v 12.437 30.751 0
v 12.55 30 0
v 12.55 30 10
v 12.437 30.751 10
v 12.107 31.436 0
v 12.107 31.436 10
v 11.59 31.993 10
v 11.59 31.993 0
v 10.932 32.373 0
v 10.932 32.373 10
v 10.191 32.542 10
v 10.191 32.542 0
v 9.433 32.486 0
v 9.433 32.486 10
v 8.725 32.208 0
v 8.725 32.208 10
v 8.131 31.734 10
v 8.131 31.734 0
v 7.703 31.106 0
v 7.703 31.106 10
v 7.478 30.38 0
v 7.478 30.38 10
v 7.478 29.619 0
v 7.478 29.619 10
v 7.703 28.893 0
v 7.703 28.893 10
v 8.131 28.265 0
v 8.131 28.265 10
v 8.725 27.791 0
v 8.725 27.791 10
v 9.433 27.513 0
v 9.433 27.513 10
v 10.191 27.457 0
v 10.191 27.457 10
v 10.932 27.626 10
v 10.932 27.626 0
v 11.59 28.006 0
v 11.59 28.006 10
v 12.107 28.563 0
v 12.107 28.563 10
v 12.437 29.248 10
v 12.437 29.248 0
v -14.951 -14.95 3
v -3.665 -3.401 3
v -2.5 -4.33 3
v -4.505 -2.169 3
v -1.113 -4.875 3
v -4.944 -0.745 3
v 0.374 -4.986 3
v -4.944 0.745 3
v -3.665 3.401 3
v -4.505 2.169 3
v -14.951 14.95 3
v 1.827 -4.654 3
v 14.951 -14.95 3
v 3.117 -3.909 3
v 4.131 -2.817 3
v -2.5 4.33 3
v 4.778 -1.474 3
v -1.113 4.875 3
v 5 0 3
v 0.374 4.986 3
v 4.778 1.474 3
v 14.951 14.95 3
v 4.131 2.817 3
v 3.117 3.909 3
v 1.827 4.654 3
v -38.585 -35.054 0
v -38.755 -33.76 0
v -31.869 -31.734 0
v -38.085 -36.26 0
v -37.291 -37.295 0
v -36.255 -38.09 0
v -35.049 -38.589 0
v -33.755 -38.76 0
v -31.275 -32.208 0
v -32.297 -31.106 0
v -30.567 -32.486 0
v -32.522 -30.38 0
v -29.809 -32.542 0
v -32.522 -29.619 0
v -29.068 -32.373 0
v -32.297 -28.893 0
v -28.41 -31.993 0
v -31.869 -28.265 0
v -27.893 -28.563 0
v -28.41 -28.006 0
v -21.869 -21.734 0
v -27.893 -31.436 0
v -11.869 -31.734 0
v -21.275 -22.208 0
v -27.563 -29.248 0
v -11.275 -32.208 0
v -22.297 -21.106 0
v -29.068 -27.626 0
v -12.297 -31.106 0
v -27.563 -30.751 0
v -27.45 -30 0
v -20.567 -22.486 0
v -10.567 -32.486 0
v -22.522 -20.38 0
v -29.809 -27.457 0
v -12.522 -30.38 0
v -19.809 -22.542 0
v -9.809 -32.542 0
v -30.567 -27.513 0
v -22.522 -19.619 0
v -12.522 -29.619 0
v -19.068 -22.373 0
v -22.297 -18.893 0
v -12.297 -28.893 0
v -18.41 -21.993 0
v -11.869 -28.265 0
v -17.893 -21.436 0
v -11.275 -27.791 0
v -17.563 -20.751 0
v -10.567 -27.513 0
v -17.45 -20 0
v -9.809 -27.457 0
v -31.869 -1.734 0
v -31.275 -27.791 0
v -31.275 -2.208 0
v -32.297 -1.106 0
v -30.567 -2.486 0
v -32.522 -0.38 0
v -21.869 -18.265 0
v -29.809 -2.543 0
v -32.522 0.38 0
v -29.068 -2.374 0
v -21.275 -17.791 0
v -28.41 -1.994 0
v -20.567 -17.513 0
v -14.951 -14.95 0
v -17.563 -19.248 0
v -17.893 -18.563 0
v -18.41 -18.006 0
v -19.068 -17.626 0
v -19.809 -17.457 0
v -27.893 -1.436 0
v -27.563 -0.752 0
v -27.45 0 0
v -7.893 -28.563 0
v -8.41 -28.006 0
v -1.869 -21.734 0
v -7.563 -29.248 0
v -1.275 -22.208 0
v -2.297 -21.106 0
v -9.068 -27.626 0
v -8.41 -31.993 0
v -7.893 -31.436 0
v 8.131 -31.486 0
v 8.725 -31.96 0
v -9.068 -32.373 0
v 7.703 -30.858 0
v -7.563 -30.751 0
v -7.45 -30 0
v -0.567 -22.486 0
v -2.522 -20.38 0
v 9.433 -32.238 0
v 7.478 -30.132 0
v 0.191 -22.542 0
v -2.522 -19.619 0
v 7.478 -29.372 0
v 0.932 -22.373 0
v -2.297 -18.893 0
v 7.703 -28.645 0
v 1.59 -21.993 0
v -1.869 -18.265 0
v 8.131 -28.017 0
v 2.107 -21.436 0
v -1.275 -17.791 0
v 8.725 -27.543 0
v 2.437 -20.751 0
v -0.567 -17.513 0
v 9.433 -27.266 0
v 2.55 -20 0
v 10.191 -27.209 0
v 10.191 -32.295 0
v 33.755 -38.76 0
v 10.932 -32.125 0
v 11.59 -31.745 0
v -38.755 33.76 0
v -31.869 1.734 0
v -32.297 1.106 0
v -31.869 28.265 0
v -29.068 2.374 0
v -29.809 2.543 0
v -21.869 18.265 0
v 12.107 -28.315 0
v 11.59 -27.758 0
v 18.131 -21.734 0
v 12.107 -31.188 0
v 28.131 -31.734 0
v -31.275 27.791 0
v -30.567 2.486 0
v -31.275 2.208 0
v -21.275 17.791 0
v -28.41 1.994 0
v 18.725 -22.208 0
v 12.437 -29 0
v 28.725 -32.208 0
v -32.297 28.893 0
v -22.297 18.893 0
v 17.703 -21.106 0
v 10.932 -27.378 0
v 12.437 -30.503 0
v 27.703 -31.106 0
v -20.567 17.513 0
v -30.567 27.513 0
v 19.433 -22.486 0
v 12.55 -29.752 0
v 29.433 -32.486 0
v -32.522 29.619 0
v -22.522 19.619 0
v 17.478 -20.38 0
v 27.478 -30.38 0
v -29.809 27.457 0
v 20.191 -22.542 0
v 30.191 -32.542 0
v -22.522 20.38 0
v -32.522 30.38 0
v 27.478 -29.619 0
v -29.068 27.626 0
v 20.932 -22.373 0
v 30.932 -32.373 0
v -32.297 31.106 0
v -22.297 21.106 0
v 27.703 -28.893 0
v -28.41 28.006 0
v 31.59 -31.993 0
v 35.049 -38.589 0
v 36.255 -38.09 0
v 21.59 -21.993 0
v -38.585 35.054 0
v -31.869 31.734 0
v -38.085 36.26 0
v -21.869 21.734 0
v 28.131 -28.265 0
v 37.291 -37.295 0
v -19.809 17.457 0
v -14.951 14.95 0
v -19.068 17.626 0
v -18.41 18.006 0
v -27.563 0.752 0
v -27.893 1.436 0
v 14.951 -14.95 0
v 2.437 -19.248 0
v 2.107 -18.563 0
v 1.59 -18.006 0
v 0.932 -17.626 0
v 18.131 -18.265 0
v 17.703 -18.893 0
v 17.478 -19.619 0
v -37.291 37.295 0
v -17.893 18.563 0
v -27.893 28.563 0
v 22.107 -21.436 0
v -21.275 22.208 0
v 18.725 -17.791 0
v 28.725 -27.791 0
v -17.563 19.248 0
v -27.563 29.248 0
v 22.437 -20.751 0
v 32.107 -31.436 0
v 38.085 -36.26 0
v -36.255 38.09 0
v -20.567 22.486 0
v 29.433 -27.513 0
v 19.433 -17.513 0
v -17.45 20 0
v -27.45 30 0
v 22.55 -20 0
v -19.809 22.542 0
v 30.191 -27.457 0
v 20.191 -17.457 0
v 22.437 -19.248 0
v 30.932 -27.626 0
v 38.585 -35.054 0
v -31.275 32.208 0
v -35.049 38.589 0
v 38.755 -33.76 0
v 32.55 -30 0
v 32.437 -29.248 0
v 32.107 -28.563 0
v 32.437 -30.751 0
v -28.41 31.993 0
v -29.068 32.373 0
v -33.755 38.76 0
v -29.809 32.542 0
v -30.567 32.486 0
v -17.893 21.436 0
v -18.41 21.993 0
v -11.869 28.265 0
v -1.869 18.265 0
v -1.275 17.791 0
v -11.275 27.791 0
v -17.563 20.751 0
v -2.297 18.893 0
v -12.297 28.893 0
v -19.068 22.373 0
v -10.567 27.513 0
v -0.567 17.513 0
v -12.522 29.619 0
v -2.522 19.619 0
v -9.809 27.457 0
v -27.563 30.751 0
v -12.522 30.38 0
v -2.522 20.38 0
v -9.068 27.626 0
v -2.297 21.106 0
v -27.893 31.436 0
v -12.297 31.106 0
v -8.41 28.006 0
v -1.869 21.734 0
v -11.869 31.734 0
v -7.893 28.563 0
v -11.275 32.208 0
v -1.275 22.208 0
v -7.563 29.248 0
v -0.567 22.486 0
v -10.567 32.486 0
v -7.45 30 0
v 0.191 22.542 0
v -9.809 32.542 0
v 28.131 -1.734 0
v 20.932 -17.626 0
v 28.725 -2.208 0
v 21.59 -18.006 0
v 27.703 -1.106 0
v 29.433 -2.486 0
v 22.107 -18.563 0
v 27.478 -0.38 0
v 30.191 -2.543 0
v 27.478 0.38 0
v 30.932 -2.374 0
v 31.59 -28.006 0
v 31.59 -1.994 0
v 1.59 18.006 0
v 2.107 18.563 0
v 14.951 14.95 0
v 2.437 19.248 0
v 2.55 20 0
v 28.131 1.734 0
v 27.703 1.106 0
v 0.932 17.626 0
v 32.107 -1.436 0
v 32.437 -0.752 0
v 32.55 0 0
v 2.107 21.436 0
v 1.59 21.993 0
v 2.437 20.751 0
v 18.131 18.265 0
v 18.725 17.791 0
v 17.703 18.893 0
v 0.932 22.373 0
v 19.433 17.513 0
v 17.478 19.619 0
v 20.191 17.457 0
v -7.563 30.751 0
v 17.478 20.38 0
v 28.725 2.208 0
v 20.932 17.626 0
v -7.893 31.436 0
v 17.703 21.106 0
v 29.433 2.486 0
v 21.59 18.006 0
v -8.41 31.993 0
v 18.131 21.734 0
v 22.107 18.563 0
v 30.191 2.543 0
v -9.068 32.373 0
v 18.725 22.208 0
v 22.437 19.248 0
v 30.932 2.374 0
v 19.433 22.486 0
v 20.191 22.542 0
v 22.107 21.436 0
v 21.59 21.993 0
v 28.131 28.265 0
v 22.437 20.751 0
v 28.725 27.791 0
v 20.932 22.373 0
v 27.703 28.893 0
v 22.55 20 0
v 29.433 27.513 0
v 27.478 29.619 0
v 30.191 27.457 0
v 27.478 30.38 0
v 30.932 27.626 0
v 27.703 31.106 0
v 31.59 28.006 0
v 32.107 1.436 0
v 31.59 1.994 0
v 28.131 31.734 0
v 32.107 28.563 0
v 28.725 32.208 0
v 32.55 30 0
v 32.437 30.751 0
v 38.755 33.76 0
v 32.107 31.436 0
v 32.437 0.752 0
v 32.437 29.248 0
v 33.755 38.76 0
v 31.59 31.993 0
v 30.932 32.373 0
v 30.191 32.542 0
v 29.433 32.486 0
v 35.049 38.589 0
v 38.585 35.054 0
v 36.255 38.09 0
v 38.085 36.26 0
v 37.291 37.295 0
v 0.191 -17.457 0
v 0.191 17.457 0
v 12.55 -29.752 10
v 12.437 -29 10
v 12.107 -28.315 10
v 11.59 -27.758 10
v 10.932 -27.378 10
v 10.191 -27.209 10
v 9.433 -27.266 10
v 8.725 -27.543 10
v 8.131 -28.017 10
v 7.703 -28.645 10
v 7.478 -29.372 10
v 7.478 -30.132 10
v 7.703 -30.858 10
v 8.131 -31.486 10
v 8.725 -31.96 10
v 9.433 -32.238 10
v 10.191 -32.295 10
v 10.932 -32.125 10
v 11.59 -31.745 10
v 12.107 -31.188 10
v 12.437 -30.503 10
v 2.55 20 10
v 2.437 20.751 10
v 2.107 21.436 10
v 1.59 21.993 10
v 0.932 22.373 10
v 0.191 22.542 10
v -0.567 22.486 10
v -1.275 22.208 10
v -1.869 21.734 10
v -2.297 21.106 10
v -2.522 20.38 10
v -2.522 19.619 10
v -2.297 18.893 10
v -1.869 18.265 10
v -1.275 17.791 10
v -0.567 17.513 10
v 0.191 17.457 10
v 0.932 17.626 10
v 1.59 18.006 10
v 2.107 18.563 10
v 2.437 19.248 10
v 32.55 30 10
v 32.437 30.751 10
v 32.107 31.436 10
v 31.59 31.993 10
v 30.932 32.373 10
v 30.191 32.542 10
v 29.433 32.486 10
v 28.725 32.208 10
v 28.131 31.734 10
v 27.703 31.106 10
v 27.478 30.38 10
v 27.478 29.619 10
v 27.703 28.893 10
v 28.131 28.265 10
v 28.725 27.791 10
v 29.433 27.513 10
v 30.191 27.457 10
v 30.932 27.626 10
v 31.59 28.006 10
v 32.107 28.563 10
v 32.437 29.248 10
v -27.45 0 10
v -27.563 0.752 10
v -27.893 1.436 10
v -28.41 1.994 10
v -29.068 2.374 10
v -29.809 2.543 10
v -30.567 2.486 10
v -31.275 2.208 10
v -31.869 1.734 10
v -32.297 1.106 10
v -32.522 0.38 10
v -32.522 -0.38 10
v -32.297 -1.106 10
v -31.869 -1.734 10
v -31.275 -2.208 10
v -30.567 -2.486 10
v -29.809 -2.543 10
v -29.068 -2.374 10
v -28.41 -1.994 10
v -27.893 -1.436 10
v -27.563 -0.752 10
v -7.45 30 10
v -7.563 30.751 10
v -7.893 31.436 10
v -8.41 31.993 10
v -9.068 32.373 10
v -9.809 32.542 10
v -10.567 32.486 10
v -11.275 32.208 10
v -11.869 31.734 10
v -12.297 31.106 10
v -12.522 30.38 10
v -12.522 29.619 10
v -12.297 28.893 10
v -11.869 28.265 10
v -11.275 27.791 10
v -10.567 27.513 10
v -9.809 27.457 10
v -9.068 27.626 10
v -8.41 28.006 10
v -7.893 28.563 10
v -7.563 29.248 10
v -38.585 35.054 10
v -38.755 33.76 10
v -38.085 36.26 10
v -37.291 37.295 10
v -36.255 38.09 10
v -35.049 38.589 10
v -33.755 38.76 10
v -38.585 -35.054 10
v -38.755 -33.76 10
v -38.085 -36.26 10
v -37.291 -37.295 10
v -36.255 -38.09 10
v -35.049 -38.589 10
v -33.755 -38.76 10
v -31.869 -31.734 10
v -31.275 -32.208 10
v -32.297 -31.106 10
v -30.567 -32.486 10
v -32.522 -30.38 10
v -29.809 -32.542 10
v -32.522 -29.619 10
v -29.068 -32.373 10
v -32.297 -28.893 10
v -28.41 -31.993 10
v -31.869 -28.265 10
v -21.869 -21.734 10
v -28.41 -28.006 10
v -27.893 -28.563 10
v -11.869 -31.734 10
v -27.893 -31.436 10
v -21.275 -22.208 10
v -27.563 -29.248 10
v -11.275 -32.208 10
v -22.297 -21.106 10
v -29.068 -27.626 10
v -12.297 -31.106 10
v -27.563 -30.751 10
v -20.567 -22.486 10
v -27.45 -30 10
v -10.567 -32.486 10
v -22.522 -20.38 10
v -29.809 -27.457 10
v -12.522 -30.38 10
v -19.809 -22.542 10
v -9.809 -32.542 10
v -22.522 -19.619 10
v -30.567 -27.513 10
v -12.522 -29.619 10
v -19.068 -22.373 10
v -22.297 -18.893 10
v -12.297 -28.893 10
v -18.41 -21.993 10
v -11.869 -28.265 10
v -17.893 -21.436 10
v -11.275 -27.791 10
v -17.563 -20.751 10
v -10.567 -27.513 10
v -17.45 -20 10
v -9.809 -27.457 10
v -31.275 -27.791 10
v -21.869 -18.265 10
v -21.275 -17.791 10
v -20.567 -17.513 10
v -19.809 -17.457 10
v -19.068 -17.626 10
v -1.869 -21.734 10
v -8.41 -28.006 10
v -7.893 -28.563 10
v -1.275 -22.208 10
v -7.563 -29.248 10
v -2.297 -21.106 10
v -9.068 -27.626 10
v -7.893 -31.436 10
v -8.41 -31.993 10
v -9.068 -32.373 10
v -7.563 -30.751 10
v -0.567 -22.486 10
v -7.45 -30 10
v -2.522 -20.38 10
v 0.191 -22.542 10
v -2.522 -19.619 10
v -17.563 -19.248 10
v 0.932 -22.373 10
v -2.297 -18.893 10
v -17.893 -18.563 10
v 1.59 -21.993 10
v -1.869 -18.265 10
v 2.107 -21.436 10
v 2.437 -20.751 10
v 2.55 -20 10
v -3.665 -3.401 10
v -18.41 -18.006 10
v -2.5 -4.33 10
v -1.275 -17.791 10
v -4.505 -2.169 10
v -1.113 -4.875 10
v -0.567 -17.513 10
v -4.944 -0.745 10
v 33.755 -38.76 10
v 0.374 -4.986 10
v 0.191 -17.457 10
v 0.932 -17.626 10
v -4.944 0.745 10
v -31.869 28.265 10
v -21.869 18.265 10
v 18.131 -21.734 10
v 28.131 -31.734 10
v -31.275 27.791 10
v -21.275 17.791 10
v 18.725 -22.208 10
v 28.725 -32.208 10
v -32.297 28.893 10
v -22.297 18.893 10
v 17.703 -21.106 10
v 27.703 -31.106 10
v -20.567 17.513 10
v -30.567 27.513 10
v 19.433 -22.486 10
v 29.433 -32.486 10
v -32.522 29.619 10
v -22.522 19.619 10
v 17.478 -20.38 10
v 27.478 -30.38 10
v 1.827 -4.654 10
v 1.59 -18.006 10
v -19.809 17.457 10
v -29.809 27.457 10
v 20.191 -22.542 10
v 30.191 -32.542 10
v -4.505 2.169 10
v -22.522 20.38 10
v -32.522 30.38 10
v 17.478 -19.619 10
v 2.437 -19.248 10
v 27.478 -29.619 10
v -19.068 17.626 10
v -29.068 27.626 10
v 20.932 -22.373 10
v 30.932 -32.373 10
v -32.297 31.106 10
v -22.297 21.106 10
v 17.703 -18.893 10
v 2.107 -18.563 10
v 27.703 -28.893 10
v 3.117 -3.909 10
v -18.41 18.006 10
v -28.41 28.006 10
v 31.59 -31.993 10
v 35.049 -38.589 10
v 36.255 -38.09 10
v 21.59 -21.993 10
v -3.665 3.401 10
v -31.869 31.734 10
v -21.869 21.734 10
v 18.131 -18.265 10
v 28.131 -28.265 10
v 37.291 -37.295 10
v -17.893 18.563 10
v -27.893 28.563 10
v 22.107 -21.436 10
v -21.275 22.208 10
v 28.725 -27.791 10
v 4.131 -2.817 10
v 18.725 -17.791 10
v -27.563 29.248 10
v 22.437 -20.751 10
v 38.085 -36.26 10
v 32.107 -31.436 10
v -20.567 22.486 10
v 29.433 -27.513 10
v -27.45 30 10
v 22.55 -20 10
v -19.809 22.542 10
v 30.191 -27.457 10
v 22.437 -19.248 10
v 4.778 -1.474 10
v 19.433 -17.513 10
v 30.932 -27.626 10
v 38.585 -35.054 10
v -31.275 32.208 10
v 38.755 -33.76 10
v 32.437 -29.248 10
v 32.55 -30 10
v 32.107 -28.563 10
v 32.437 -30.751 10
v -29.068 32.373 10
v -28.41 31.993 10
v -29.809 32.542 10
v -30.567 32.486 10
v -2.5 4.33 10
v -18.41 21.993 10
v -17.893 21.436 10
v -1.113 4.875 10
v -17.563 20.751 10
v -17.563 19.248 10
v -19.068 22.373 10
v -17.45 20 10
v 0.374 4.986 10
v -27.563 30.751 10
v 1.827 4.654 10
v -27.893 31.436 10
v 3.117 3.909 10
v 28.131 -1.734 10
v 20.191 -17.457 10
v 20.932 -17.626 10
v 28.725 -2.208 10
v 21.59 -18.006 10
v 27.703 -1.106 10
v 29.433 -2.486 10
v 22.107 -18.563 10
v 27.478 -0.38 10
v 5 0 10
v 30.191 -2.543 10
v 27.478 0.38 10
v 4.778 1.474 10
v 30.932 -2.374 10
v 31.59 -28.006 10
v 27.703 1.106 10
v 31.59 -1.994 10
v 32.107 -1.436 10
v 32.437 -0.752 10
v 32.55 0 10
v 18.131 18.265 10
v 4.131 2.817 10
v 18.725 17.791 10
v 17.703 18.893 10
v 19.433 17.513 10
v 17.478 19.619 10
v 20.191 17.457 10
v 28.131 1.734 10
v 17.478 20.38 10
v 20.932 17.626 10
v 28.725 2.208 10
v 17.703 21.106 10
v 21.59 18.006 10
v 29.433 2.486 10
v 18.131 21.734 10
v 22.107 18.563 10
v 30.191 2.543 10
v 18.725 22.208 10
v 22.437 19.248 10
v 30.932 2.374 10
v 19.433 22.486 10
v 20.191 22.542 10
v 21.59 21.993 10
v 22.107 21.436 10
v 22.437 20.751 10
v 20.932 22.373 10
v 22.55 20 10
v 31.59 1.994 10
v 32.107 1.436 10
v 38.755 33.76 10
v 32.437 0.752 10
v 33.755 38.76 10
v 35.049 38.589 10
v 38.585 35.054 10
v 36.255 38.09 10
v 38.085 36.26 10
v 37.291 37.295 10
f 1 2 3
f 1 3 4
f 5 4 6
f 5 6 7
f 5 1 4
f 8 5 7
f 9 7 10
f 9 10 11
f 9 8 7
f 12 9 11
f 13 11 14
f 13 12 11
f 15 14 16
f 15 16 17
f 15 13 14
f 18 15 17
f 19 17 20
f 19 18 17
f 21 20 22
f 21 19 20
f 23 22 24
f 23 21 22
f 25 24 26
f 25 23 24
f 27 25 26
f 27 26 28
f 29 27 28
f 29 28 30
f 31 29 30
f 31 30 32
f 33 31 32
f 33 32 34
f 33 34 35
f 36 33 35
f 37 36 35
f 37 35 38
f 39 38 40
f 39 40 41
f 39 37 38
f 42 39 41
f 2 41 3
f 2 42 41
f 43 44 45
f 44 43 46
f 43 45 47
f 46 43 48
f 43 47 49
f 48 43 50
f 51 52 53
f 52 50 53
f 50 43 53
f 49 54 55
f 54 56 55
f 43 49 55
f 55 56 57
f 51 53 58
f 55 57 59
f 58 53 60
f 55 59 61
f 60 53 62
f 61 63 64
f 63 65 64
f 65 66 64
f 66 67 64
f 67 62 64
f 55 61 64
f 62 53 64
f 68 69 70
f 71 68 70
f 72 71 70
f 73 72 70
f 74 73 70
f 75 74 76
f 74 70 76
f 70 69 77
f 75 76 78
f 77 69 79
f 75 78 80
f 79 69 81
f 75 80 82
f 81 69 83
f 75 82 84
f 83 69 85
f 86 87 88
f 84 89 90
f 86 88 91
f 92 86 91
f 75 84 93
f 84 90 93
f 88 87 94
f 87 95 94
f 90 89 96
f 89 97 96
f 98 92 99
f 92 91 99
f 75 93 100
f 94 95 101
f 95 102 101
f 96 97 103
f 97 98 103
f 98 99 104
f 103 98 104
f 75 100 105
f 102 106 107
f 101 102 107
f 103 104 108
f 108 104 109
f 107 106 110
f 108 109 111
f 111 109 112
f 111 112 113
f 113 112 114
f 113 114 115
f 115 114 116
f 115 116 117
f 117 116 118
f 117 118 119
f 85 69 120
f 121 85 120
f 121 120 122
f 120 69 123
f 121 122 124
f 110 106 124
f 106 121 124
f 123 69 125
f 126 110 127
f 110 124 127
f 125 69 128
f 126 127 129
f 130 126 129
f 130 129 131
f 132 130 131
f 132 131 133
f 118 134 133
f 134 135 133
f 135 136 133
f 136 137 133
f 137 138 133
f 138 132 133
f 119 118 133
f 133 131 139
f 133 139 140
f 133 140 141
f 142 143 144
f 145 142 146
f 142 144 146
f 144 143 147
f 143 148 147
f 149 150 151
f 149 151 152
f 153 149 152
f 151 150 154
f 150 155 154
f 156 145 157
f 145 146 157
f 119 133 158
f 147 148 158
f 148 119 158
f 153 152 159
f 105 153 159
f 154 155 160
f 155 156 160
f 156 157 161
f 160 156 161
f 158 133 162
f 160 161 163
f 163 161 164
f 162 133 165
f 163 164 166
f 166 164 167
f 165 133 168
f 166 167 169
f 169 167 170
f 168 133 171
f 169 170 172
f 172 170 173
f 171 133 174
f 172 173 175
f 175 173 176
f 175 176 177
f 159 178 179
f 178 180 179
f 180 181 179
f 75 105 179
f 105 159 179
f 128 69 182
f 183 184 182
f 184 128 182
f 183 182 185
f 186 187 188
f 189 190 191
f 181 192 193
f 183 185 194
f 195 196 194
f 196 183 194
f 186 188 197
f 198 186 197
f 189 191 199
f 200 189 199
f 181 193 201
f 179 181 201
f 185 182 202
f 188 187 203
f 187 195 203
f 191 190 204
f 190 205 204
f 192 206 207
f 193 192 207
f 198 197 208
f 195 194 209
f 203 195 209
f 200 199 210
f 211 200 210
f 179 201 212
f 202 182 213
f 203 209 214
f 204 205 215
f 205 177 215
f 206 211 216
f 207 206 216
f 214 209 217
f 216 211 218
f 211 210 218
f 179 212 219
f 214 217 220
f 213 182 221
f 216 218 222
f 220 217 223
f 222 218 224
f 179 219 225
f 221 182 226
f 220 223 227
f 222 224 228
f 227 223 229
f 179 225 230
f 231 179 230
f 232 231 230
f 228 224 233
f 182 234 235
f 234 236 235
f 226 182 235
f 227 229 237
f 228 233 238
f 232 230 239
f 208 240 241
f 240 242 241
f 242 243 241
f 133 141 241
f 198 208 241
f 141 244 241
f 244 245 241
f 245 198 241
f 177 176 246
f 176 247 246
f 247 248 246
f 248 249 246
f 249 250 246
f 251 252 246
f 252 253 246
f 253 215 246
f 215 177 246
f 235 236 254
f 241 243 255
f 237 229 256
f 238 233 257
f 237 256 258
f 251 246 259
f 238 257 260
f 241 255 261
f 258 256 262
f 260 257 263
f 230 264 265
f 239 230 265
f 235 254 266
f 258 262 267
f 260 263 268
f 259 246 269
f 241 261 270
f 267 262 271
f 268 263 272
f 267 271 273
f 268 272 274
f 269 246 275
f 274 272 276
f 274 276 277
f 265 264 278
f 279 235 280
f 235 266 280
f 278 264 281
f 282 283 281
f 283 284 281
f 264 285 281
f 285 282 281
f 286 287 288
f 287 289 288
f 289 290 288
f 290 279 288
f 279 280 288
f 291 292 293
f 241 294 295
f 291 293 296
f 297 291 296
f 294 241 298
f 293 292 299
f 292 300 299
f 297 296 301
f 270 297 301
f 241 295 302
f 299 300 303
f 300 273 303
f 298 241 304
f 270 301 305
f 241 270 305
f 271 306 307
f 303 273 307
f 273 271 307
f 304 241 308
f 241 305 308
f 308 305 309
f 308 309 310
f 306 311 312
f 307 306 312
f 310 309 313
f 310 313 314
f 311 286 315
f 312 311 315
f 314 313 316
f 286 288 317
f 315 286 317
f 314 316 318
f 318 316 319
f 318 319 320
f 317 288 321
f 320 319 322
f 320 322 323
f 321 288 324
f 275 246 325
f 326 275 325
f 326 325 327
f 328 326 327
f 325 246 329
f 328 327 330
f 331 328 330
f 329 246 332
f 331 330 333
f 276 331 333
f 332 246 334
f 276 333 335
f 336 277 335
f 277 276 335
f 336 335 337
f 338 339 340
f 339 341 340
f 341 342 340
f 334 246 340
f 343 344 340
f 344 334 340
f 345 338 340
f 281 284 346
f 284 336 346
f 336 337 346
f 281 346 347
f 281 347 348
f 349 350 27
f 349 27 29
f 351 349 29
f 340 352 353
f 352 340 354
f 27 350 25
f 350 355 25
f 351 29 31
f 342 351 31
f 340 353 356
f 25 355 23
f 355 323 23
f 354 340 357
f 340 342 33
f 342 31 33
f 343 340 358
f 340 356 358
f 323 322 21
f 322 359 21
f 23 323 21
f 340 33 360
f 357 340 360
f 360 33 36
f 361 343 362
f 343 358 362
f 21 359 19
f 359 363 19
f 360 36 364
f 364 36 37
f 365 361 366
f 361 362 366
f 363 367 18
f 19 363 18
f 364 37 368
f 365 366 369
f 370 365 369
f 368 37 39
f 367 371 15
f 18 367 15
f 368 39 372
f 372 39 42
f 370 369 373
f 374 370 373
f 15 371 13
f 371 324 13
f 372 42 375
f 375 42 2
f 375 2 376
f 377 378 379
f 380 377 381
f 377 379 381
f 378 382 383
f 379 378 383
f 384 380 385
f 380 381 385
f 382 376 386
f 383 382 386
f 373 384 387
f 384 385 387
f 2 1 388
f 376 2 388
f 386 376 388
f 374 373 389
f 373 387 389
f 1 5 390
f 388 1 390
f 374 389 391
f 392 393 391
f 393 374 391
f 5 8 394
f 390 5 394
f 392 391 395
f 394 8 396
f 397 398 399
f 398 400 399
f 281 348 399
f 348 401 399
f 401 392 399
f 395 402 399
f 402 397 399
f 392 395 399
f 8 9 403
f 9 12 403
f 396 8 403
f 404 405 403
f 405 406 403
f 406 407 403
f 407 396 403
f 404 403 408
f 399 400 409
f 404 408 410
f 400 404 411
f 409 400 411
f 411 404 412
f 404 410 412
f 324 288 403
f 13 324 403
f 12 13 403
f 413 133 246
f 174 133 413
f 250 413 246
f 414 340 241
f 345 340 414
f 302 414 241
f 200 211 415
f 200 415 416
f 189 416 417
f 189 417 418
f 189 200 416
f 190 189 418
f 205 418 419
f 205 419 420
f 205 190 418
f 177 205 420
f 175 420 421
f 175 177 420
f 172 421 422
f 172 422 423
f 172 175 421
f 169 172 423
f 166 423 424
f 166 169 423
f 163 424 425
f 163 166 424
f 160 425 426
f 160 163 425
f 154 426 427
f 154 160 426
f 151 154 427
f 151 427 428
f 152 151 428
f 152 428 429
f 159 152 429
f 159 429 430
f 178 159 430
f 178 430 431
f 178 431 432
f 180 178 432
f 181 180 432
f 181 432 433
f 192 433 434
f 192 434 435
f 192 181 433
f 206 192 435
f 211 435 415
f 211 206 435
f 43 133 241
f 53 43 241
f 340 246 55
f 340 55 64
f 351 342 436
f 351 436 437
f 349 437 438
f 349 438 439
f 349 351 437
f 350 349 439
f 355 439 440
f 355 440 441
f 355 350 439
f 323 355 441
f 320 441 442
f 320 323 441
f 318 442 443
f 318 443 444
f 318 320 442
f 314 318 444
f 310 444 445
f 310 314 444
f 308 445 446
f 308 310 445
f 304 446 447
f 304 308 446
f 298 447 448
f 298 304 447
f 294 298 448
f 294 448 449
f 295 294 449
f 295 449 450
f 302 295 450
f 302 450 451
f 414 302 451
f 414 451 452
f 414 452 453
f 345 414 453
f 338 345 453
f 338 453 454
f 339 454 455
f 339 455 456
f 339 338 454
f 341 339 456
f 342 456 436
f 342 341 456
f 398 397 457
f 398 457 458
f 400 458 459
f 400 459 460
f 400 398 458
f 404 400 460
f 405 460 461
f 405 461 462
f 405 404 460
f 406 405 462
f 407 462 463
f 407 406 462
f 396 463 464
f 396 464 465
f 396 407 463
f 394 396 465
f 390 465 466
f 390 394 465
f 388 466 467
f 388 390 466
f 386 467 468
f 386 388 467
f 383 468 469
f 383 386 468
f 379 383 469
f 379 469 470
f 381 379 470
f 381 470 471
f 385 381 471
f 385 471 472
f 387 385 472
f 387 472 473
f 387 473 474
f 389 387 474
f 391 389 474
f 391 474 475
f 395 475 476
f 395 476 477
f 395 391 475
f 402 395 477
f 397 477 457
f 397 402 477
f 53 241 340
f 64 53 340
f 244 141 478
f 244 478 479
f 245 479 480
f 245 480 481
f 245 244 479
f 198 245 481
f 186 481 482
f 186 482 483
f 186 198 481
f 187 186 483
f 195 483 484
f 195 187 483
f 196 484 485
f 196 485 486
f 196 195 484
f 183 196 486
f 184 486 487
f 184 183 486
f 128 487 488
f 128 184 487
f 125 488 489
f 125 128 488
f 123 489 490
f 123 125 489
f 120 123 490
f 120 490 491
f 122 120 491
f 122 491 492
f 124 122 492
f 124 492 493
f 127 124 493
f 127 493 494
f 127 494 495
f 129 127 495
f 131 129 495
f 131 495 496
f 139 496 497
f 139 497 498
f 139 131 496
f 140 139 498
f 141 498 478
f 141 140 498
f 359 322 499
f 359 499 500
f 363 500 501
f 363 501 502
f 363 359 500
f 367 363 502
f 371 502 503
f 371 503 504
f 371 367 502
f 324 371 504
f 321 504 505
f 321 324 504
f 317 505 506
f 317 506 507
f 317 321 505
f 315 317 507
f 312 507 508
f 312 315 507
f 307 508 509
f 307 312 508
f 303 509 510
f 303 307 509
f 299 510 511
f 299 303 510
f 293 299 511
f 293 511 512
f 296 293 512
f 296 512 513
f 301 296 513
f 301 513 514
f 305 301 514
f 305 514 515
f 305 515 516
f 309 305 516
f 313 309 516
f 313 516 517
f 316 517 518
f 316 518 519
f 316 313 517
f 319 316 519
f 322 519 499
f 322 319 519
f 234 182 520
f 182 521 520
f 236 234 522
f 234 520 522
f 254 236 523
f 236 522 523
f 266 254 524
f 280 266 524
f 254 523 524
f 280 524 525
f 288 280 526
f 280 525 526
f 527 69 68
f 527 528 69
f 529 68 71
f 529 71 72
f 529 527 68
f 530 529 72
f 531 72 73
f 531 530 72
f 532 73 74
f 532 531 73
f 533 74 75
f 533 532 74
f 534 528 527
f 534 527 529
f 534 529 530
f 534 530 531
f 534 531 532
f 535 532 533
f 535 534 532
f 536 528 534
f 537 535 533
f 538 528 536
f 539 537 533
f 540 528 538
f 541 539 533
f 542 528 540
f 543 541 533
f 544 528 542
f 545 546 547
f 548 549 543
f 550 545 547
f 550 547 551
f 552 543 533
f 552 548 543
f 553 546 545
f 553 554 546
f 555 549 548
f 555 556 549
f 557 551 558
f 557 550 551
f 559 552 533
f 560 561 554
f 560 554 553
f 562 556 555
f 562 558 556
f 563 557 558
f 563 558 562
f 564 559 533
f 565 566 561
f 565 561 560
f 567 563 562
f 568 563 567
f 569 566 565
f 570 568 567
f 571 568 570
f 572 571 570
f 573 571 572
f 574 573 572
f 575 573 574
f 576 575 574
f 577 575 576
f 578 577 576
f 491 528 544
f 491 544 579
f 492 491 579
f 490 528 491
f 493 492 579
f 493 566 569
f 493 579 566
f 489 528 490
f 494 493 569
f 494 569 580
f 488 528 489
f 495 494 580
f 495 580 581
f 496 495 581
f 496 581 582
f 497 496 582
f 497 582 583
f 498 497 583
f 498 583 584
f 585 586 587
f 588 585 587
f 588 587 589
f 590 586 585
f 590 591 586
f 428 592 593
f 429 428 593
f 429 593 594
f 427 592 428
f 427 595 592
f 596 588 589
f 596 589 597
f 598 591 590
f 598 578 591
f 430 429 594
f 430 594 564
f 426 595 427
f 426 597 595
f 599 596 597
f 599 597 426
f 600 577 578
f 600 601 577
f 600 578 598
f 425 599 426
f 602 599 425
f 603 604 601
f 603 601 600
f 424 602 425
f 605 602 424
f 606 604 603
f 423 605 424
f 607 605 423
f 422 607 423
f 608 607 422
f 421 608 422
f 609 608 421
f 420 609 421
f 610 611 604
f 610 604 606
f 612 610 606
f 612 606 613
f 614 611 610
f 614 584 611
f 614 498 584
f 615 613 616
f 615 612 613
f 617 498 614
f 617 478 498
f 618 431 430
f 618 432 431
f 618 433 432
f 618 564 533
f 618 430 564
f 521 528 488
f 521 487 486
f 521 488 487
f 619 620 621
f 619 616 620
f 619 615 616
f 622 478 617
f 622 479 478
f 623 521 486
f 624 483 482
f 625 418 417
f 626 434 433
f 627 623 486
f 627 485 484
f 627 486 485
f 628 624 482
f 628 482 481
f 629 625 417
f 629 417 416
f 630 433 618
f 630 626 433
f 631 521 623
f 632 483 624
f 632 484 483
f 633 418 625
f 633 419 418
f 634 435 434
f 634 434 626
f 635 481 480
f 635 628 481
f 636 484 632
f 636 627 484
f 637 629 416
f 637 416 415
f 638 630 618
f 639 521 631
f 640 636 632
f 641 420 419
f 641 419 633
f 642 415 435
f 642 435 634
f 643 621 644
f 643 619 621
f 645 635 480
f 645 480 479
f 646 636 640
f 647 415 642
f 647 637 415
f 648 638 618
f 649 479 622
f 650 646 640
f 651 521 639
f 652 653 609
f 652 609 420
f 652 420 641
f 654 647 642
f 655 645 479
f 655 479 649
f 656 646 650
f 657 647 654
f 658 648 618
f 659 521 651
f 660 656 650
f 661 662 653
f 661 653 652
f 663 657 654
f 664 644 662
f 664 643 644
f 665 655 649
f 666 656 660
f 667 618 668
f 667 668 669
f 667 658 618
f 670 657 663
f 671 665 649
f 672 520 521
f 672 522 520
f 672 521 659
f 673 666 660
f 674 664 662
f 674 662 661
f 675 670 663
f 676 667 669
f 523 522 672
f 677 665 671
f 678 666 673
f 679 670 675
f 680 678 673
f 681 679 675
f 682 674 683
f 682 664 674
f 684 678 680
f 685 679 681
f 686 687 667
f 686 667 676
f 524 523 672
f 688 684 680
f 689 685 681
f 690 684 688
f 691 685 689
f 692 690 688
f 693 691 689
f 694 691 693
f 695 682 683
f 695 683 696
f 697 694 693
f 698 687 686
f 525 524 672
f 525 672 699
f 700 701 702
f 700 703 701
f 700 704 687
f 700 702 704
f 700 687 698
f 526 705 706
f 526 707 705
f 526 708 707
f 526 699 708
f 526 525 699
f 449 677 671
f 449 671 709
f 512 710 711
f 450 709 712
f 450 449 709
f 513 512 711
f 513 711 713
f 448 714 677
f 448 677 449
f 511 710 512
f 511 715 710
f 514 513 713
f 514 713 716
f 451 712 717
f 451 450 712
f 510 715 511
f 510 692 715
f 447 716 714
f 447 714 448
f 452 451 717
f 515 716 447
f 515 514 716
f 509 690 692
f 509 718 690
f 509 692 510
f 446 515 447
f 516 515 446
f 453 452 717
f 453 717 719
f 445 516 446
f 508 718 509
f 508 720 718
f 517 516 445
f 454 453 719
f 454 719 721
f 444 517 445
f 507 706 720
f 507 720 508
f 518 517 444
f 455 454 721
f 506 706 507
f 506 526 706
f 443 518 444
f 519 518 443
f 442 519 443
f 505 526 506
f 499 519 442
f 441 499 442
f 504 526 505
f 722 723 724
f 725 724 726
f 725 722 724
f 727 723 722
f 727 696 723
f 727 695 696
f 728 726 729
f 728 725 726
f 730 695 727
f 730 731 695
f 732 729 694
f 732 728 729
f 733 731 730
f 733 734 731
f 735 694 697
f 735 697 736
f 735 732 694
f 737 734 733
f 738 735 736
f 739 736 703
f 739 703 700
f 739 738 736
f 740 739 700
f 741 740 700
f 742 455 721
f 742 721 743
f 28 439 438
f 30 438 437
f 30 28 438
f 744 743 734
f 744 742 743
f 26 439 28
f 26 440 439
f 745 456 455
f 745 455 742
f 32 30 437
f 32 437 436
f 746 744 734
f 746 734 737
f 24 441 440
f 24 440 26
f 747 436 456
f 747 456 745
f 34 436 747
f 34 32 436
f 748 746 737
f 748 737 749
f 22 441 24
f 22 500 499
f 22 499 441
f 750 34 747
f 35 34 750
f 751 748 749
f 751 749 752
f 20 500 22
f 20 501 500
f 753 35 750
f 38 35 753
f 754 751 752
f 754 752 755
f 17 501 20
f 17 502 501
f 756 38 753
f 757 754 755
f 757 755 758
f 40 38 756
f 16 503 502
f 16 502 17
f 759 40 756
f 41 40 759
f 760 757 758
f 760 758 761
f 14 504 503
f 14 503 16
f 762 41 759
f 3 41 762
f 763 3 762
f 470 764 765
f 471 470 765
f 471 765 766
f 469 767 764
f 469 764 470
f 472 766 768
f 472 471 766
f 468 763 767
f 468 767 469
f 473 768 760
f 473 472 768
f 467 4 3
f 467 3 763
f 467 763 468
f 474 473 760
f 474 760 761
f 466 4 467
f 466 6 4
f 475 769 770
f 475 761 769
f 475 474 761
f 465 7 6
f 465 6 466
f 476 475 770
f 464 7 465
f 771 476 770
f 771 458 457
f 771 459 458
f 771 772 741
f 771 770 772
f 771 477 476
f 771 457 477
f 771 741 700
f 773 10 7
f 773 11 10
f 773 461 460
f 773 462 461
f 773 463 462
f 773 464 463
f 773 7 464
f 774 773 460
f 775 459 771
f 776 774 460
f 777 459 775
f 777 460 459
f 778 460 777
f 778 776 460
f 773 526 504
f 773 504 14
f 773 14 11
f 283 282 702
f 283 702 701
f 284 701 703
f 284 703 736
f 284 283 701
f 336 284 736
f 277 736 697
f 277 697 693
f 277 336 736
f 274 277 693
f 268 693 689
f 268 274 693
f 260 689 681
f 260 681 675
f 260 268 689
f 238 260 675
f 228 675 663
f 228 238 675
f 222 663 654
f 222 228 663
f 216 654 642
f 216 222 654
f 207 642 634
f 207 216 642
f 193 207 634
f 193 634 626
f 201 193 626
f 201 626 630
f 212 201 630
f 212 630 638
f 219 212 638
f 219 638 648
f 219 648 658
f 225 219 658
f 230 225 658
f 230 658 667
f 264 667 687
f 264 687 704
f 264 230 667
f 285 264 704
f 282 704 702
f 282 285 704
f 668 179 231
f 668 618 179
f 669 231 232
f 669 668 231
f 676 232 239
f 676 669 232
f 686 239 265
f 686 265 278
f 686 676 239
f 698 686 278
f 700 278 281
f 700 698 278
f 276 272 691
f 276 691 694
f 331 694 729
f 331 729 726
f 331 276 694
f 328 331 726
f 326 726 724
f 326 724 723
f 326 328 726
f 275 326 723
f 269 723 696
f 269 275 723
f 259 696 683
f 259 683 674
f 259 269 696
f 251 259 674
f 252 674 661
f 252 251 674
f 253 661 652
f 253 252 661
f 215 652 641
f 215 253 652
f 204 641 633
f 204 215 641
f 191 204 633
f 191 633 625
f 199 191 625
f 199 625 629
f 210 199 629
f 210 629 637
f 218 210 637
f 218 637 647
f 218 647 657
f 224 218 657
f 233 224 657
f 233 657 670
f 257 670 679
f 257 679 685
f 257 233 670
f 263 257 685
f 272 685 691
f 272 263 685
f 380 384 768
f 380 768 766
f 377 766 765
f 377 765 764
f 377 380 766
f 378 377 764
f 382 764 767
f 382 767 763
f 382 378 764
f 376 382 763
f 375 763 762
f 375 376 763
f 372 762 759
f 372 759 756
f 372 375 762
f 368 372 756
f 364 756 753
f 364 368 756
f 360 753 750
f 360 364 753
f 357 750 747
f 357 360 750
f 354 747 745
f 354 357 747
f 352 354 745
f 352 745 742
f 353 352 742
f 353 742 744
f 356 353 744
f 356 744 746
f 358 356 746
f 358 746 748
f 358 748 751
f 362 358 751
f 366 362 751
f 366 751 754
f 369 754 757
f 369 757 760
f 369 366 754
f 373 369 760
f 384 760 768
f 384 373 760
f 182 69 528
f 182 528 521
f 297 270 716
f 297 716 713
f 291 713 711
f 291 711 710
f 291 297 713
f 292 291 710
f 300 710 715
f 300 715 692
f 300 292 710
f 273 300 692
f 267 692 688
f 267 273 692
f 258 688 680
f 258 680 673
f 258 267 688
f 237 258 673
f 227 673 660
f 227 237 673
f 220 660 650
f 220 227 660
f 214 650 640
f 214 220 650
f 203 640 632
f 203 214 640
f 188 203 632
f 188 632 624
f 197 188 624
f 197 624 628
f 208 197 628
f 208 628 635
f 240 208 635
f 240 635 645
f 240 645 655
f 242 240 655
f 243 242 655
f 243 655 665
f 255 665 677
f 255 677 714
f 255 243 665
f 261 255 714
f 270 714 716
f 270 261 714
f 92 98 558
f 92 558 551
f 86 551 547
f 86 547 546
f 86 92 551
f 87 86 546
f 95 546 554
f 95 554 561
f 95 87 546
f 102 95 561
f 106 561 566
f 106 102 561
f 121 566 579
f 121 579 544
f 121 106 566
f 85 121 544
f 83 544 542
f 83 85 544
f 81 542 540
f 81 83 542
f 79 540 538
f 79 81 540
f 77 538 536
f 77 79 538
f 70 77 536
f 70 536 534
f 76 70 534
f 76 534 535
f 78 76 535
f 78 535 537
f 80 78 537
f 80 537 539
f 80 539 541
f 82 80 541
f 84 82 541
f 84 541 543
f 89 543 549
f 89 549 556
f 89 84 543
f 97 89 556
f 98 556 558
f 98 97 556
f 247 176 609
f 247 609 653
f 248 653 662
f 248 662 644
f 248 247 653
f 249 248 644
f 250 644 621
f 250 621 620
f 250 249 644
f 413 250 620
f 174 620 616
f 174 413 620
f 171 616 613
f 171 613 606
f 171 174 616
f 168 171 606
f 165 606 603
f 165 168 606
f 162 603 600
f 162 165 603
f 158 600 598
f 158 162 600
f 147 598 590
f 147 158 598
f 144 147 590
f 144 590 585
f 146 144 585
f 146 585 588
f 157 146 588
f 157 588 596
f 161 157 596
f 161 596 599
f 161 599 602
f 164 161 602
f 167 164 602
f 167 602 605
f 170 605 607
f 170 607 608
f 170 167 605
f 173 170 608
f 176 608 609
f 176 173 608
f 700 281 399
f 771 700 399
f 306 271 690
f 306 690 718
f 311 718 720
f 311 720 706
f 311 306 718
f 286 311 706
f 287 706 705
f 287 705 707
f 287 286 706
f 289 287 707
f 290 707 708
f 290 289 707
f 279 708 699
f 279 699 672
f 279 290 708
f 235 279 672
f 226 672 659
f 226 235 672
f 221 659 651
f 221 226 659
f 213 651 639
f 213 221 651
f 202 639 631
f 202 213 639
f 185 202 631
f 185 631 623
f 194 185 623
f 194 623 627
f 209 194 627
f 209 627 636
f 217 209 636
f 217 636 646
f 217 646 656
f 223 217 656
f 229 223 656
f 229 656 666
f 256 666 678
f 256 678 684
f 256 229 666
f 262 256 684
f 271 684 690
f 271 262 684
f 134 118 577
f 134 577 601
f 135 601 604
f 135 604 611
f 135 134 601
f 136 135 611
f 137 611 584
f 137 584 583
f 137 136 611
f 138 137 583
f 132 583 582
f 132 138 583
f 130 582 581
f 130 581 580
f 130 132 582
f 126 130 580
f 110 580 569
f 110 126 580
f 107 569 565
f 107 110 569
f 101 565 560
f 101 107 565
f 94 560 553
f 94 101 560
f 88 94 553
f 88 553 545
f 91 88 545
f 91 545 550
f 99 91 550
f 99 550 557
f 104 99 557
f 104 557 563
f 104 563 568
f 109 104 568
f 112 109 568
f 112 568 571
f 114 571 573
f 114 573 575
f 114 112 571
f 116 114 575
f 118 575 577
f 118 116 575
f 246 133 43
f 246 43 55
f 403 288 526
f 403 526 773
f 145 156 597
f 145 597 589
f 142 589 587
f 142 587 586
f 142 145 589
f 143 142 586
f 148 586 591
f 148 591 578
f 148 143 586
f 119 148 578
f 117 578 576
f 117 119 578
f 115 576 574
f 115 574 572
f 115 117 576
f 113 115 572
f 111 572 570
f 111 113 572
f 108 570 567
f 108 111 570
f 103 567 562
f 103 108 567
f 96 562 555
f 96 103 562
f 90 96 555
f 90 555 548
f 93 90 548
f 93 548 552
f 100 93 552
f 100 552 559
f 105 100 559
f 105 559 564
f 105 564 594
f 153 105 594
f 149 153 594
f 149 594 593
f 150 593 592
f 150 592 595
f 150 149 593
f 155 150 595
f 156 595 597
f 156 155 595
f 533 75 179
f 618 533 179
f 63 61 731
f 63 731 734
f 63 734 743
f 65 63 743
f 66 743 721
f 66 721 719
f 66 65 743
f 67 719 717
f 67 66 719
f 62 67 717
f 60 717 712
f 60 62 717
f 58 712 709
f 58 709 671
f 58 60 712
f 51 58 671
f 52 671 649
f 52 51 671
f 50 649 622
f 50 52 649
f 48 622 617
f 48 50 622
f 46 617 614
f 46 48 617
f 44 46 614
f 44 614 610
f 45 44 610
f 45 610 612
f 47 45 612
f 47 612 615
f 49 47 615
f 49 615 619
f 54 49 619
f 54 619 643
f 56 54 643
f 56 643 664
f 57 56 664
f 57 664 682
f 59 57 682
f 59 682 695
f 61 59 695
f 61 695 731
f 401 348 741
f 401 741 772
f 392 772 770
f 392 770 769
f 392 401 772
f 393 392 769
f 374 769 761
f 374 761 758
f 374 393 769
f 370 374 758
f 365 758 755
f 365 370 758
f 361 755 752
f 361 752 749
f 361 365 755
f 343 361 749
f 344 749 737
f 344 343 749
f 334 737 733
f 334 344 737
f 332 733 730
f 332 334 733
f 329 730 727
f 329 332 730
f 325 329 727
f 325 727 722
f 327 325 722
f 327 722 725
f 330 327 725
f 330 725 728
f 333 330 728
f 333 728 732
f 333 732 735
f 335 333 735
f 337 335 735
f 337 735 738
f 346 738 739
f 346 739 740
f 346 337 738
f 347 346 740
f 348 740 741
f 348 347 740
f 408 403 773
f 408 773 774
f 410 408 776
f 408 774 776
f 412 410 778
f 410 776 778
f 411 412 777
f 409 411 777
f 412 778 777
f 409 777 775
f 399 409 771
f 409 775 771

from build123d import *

# Parameters (mm, degrees)
F0_W     = 77.51
F0_H     = 77.519
F0_R     = 2.55
F0_W_2   = 29.902
F0_H_2   = 29.9
F0_R_2   = 5
F1_DEPTH = 10
F2_DEPTH = 3
F3_R     = 5


with BuildPart() as f1:
    # F0 (on Top) → F1 (new body)
    with BuildSketch(Plane.XY):
        Rectangle(F0_W, F0_H)
        with Locations((-30, -29.9995)):
            Circle(F0_R, mode=Mode.SUBTRACT)
        with Locations((-20, -19.9995)):
            Circle(F0_R, mode=Mode.SUBTRACT)
        with Locations((-10, -29.9995)):
            Circle(F0_R, mode=Mode.SUBTRACT)
        with Locations((10, -29.751634)):
            Circle(F0_R, mode=Mode.SUBTRACT)
        with Locations((0, -19.9995)):
            Circle(F0_R, mode=Mode.SUBTRACT)
        with Locations((30, -29.9995)):
            Circle(F0_R, mode=Mode.SUBTRACT)
        with Locations((20, -19.9995)):
            Circle(F0_R, mode=Mode.SUBTRACT)
        with Locations((-30, 0)):
            Circle(F0_R, mode=Mode.SUBTRACT)
        with Locations((-20, 19.9995)):
            Circle(F0_R, mode=Mode.SUBTRACT)
        with Locations((-30, 29.9995)):
            Circle(F0_R, mode=Mode.SUBTRACT)
        with Locations((-10, 29.9995)):
            Circle(F0_R, mode=Mode.SUBTRACT)
        Rectangle(F0_W_2, F0_H_2, mode=Mode.SUBTRACT)
        with Locations((30, 0)):
            Circle(F0_R, mode=Mode.SUBTRACT)
        with Locations((0, 19.9995)):
            Circle(F0_R, mode=Mode.SUBTRACT)
        with Locations((10, 29.9995)):
            Circle(F0_R, mode=Mode.SUBTRACT)
        with Locations((20, 19.9995)):
            Circle(F0_R, mode=Mode.SUBTRACT)
        with Locations((30, 29.9995)):
            Circle(F0_R, mode=Mode.SUBTRACT)
        Rectangle(F0_W_2, F0_H_2)
        Circle(F0_R_2, mode=Mode.SUBTRACT)
    extrude(amount=F1_DEPTH)

    # F0 (on Top) → F2 (cut)
    with BuildSketch(Plane.XY):
        Rectangle(F0_W_2, F0_H_2)
        Circle(F0_R_2, mode=Mode.SUBTRACT)
    extrude(amount=F2_DEPTH, mode=Mode.SUBTRACT)

    # F3
    f3_edges = [f1.edges().sort_by_distance(p)[0] for p in [
        (38.755, -38.7595, 5),
        (-38.755, -38.7595, 5),
        (38.755, 38.7595, 5),
        (-38.755, 38.7595, 5),
    ]]
    fillet(f3_edges, radius=F3_R)


solid = f1.part
